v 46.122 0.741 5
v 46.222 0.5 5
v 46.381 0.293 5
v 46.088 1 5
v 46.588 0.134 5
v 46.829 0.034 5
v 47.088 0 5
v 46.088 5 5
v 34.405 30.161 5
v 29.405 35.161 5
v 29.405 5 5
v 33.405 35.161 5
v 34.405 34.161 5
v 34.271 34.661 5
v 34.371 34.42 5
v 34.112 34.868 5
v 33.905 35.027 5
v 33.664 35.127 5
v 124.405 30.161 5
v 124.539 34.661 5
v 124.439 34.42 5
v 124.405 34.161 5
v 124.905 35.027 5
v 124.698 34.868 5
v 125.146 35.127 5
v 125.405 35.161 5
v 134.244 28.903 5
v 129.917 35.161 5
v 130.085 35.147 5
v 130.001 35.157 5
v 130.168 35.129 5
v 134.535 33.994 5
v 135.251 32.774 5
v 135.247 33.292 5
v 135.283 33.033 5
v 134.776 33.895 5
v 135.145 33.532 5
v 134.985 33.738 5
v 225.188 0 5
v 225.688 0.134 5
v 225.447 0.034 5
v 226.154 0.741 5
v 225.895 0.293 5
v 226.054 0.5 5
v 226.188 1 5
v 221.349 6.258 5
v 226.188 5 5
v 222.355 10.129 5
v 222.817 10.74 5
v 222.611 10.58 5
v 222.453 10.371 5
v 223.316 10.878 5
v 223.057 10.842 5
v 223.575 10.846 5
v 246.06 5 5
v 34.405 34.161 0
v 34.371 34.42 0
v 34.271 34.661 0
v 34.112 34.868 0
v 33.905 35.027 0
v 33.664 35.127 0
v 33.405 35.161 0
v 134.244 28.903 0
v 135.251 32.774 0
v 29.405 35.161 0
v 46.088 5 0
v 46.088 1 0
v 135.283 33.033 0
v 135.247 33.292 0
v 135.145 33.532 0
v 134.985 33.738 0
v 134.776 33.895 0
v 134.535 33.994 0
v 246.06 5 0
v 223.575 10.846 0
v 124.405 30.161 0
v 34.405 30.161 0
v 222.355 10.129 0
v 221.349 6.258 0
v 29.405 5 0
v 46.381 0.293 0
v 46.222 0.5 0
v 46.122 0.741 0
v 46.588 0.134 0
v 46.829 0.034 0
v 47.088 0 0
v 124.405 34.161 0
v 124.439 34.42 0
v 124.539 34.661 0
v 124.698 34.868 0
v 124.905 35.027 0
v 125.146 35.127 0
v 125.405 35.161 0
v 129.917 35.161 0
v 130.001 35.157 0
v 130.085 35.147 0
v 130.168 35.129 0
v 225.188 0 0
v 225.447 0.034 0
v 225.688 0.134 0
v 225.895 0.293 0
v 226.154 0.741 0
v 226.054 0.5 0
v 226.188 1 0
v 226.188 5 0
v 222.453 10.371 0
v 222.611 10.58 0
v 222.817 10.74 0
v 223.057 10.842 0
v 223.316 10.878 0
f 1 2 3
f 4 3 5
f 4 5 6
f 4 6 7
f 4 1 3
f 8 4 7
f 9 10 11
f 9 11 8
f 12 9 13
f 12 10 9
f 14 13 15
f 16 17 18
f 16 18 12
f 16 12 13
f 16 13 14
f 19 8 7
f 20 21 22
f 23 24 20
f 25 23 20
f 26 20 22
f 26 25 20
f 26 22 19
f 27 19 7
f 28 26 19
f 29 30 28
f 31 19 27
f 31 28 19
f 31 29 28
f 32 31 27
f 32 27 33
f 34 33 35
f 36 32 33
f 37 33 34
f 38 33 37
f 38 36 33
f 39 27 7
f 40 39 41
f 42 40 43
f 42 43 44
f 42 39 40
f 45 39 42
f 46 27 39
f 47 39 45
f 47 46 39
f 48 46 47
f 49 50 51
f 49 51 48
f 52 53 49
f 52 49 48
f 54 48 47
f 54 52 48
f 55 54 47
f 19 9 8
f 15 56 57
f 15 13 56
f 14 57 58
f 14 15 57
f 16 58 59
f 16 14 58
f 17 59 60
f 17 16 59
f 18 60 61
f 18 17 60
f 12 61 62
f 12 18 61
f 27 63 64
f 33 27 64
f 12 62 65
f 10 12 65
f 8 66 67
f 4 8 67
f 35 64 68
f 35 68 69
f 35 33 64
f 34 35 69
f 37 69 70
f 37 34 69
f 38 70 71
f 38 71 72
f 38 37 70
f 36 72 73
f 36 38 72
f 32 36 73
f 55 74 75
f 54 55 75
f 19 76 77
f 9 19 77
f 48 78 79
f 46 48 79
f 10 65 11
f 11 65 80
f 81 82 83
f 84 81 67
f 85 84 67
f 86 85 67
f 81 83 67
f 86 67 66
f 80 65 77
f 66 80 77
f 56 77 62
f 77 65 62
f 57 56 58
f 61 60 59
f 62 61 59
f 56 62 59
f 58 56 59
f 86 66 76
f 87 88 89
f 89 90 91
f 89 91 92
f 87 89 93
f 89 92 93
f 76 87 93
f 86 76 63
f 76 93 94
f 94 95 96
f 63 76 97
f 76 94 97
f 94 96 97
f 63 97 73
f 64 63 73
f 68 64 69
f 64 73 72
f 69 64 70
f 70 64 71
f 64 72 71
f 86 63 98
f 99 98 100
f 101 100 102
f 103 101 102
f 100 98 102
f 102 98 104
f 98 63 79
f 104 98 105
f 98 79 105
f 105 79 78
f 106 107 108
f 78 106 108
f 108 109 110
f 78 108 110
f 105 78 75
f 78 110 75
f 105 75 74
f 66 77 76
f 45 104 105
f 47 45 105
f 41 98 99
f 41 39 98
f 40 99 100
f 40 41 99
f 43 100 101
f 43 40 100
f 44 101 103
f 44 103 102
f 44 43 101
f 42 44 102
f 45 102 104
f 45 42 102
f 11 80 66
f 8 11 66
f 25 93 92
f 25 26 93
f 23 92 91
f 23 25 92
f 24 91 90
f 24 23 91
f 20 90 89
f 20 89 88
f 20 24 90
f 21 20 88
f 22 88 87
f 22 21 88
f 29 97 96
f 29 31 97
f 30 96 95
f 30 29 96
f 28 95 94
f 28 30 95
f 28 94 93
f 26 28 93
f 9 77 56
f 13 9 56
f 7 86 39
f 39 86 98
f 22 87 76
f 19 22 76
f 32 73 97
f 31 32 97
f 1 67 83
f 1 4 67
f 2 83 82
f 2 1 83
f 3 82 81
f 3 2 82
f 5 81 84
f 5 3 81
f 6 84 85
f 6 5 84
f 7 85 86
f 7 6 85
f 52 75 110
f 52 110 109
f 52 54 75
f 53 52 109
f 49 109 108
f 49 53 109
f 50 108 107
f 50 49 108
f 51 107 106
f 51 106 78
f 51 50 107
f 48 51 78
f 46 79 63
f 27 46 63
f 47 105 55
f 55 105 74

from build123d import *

# Parameters (mm, degrees)
BOSS_EXTRUDE1_DEPTH = 5
FILLET1_R           = 1


with BuildPart() as part:
    # Sketch1 → Boss-Extrude1 (new body)
    with BuildSketch(Plane.XY):
        Polygon((29.405194241, 5), (46.088102842, 5), (46.088102842, 0), (226.188102842, 0), (226.188102842, 5), (246.060241867, 5), (222.607000141, 11.097188159), (221.348957412, 6.258042728), (134.244339671, 28.902811841), (135.5023824, 33.741957272), (130.044499116, 35.16085457), (124.405194241, 35.16085457), (124.405194241, 30.16085457), (34.405194241, 30.16085457), (34.405194241, 35.16085457), (29.405194241, 35.16085457), align=None)
    extrude(amount=BOSS_EXTRUDE1_DEPTH)

    # Fillet1
    fillet1_edges = [part.edges().sort_by_distance(p)[0] for p in [
        (130.044499116, 35.16085457, 2.5),
        (135.5023824, 33.741957272, 2.5),
        (222.607000141, 11.097188159, 2.5),
        (226.188102842, 0, 2.5),
        (46.088102842, 0, 2.5),
        (34.405194241, 35.16085457, 2.5),
        (124.405194241, 35.16085457, 2.5),
    ]]
    fillet(fillet1_edges, radius=FILLET1_R)


solid = part.part
